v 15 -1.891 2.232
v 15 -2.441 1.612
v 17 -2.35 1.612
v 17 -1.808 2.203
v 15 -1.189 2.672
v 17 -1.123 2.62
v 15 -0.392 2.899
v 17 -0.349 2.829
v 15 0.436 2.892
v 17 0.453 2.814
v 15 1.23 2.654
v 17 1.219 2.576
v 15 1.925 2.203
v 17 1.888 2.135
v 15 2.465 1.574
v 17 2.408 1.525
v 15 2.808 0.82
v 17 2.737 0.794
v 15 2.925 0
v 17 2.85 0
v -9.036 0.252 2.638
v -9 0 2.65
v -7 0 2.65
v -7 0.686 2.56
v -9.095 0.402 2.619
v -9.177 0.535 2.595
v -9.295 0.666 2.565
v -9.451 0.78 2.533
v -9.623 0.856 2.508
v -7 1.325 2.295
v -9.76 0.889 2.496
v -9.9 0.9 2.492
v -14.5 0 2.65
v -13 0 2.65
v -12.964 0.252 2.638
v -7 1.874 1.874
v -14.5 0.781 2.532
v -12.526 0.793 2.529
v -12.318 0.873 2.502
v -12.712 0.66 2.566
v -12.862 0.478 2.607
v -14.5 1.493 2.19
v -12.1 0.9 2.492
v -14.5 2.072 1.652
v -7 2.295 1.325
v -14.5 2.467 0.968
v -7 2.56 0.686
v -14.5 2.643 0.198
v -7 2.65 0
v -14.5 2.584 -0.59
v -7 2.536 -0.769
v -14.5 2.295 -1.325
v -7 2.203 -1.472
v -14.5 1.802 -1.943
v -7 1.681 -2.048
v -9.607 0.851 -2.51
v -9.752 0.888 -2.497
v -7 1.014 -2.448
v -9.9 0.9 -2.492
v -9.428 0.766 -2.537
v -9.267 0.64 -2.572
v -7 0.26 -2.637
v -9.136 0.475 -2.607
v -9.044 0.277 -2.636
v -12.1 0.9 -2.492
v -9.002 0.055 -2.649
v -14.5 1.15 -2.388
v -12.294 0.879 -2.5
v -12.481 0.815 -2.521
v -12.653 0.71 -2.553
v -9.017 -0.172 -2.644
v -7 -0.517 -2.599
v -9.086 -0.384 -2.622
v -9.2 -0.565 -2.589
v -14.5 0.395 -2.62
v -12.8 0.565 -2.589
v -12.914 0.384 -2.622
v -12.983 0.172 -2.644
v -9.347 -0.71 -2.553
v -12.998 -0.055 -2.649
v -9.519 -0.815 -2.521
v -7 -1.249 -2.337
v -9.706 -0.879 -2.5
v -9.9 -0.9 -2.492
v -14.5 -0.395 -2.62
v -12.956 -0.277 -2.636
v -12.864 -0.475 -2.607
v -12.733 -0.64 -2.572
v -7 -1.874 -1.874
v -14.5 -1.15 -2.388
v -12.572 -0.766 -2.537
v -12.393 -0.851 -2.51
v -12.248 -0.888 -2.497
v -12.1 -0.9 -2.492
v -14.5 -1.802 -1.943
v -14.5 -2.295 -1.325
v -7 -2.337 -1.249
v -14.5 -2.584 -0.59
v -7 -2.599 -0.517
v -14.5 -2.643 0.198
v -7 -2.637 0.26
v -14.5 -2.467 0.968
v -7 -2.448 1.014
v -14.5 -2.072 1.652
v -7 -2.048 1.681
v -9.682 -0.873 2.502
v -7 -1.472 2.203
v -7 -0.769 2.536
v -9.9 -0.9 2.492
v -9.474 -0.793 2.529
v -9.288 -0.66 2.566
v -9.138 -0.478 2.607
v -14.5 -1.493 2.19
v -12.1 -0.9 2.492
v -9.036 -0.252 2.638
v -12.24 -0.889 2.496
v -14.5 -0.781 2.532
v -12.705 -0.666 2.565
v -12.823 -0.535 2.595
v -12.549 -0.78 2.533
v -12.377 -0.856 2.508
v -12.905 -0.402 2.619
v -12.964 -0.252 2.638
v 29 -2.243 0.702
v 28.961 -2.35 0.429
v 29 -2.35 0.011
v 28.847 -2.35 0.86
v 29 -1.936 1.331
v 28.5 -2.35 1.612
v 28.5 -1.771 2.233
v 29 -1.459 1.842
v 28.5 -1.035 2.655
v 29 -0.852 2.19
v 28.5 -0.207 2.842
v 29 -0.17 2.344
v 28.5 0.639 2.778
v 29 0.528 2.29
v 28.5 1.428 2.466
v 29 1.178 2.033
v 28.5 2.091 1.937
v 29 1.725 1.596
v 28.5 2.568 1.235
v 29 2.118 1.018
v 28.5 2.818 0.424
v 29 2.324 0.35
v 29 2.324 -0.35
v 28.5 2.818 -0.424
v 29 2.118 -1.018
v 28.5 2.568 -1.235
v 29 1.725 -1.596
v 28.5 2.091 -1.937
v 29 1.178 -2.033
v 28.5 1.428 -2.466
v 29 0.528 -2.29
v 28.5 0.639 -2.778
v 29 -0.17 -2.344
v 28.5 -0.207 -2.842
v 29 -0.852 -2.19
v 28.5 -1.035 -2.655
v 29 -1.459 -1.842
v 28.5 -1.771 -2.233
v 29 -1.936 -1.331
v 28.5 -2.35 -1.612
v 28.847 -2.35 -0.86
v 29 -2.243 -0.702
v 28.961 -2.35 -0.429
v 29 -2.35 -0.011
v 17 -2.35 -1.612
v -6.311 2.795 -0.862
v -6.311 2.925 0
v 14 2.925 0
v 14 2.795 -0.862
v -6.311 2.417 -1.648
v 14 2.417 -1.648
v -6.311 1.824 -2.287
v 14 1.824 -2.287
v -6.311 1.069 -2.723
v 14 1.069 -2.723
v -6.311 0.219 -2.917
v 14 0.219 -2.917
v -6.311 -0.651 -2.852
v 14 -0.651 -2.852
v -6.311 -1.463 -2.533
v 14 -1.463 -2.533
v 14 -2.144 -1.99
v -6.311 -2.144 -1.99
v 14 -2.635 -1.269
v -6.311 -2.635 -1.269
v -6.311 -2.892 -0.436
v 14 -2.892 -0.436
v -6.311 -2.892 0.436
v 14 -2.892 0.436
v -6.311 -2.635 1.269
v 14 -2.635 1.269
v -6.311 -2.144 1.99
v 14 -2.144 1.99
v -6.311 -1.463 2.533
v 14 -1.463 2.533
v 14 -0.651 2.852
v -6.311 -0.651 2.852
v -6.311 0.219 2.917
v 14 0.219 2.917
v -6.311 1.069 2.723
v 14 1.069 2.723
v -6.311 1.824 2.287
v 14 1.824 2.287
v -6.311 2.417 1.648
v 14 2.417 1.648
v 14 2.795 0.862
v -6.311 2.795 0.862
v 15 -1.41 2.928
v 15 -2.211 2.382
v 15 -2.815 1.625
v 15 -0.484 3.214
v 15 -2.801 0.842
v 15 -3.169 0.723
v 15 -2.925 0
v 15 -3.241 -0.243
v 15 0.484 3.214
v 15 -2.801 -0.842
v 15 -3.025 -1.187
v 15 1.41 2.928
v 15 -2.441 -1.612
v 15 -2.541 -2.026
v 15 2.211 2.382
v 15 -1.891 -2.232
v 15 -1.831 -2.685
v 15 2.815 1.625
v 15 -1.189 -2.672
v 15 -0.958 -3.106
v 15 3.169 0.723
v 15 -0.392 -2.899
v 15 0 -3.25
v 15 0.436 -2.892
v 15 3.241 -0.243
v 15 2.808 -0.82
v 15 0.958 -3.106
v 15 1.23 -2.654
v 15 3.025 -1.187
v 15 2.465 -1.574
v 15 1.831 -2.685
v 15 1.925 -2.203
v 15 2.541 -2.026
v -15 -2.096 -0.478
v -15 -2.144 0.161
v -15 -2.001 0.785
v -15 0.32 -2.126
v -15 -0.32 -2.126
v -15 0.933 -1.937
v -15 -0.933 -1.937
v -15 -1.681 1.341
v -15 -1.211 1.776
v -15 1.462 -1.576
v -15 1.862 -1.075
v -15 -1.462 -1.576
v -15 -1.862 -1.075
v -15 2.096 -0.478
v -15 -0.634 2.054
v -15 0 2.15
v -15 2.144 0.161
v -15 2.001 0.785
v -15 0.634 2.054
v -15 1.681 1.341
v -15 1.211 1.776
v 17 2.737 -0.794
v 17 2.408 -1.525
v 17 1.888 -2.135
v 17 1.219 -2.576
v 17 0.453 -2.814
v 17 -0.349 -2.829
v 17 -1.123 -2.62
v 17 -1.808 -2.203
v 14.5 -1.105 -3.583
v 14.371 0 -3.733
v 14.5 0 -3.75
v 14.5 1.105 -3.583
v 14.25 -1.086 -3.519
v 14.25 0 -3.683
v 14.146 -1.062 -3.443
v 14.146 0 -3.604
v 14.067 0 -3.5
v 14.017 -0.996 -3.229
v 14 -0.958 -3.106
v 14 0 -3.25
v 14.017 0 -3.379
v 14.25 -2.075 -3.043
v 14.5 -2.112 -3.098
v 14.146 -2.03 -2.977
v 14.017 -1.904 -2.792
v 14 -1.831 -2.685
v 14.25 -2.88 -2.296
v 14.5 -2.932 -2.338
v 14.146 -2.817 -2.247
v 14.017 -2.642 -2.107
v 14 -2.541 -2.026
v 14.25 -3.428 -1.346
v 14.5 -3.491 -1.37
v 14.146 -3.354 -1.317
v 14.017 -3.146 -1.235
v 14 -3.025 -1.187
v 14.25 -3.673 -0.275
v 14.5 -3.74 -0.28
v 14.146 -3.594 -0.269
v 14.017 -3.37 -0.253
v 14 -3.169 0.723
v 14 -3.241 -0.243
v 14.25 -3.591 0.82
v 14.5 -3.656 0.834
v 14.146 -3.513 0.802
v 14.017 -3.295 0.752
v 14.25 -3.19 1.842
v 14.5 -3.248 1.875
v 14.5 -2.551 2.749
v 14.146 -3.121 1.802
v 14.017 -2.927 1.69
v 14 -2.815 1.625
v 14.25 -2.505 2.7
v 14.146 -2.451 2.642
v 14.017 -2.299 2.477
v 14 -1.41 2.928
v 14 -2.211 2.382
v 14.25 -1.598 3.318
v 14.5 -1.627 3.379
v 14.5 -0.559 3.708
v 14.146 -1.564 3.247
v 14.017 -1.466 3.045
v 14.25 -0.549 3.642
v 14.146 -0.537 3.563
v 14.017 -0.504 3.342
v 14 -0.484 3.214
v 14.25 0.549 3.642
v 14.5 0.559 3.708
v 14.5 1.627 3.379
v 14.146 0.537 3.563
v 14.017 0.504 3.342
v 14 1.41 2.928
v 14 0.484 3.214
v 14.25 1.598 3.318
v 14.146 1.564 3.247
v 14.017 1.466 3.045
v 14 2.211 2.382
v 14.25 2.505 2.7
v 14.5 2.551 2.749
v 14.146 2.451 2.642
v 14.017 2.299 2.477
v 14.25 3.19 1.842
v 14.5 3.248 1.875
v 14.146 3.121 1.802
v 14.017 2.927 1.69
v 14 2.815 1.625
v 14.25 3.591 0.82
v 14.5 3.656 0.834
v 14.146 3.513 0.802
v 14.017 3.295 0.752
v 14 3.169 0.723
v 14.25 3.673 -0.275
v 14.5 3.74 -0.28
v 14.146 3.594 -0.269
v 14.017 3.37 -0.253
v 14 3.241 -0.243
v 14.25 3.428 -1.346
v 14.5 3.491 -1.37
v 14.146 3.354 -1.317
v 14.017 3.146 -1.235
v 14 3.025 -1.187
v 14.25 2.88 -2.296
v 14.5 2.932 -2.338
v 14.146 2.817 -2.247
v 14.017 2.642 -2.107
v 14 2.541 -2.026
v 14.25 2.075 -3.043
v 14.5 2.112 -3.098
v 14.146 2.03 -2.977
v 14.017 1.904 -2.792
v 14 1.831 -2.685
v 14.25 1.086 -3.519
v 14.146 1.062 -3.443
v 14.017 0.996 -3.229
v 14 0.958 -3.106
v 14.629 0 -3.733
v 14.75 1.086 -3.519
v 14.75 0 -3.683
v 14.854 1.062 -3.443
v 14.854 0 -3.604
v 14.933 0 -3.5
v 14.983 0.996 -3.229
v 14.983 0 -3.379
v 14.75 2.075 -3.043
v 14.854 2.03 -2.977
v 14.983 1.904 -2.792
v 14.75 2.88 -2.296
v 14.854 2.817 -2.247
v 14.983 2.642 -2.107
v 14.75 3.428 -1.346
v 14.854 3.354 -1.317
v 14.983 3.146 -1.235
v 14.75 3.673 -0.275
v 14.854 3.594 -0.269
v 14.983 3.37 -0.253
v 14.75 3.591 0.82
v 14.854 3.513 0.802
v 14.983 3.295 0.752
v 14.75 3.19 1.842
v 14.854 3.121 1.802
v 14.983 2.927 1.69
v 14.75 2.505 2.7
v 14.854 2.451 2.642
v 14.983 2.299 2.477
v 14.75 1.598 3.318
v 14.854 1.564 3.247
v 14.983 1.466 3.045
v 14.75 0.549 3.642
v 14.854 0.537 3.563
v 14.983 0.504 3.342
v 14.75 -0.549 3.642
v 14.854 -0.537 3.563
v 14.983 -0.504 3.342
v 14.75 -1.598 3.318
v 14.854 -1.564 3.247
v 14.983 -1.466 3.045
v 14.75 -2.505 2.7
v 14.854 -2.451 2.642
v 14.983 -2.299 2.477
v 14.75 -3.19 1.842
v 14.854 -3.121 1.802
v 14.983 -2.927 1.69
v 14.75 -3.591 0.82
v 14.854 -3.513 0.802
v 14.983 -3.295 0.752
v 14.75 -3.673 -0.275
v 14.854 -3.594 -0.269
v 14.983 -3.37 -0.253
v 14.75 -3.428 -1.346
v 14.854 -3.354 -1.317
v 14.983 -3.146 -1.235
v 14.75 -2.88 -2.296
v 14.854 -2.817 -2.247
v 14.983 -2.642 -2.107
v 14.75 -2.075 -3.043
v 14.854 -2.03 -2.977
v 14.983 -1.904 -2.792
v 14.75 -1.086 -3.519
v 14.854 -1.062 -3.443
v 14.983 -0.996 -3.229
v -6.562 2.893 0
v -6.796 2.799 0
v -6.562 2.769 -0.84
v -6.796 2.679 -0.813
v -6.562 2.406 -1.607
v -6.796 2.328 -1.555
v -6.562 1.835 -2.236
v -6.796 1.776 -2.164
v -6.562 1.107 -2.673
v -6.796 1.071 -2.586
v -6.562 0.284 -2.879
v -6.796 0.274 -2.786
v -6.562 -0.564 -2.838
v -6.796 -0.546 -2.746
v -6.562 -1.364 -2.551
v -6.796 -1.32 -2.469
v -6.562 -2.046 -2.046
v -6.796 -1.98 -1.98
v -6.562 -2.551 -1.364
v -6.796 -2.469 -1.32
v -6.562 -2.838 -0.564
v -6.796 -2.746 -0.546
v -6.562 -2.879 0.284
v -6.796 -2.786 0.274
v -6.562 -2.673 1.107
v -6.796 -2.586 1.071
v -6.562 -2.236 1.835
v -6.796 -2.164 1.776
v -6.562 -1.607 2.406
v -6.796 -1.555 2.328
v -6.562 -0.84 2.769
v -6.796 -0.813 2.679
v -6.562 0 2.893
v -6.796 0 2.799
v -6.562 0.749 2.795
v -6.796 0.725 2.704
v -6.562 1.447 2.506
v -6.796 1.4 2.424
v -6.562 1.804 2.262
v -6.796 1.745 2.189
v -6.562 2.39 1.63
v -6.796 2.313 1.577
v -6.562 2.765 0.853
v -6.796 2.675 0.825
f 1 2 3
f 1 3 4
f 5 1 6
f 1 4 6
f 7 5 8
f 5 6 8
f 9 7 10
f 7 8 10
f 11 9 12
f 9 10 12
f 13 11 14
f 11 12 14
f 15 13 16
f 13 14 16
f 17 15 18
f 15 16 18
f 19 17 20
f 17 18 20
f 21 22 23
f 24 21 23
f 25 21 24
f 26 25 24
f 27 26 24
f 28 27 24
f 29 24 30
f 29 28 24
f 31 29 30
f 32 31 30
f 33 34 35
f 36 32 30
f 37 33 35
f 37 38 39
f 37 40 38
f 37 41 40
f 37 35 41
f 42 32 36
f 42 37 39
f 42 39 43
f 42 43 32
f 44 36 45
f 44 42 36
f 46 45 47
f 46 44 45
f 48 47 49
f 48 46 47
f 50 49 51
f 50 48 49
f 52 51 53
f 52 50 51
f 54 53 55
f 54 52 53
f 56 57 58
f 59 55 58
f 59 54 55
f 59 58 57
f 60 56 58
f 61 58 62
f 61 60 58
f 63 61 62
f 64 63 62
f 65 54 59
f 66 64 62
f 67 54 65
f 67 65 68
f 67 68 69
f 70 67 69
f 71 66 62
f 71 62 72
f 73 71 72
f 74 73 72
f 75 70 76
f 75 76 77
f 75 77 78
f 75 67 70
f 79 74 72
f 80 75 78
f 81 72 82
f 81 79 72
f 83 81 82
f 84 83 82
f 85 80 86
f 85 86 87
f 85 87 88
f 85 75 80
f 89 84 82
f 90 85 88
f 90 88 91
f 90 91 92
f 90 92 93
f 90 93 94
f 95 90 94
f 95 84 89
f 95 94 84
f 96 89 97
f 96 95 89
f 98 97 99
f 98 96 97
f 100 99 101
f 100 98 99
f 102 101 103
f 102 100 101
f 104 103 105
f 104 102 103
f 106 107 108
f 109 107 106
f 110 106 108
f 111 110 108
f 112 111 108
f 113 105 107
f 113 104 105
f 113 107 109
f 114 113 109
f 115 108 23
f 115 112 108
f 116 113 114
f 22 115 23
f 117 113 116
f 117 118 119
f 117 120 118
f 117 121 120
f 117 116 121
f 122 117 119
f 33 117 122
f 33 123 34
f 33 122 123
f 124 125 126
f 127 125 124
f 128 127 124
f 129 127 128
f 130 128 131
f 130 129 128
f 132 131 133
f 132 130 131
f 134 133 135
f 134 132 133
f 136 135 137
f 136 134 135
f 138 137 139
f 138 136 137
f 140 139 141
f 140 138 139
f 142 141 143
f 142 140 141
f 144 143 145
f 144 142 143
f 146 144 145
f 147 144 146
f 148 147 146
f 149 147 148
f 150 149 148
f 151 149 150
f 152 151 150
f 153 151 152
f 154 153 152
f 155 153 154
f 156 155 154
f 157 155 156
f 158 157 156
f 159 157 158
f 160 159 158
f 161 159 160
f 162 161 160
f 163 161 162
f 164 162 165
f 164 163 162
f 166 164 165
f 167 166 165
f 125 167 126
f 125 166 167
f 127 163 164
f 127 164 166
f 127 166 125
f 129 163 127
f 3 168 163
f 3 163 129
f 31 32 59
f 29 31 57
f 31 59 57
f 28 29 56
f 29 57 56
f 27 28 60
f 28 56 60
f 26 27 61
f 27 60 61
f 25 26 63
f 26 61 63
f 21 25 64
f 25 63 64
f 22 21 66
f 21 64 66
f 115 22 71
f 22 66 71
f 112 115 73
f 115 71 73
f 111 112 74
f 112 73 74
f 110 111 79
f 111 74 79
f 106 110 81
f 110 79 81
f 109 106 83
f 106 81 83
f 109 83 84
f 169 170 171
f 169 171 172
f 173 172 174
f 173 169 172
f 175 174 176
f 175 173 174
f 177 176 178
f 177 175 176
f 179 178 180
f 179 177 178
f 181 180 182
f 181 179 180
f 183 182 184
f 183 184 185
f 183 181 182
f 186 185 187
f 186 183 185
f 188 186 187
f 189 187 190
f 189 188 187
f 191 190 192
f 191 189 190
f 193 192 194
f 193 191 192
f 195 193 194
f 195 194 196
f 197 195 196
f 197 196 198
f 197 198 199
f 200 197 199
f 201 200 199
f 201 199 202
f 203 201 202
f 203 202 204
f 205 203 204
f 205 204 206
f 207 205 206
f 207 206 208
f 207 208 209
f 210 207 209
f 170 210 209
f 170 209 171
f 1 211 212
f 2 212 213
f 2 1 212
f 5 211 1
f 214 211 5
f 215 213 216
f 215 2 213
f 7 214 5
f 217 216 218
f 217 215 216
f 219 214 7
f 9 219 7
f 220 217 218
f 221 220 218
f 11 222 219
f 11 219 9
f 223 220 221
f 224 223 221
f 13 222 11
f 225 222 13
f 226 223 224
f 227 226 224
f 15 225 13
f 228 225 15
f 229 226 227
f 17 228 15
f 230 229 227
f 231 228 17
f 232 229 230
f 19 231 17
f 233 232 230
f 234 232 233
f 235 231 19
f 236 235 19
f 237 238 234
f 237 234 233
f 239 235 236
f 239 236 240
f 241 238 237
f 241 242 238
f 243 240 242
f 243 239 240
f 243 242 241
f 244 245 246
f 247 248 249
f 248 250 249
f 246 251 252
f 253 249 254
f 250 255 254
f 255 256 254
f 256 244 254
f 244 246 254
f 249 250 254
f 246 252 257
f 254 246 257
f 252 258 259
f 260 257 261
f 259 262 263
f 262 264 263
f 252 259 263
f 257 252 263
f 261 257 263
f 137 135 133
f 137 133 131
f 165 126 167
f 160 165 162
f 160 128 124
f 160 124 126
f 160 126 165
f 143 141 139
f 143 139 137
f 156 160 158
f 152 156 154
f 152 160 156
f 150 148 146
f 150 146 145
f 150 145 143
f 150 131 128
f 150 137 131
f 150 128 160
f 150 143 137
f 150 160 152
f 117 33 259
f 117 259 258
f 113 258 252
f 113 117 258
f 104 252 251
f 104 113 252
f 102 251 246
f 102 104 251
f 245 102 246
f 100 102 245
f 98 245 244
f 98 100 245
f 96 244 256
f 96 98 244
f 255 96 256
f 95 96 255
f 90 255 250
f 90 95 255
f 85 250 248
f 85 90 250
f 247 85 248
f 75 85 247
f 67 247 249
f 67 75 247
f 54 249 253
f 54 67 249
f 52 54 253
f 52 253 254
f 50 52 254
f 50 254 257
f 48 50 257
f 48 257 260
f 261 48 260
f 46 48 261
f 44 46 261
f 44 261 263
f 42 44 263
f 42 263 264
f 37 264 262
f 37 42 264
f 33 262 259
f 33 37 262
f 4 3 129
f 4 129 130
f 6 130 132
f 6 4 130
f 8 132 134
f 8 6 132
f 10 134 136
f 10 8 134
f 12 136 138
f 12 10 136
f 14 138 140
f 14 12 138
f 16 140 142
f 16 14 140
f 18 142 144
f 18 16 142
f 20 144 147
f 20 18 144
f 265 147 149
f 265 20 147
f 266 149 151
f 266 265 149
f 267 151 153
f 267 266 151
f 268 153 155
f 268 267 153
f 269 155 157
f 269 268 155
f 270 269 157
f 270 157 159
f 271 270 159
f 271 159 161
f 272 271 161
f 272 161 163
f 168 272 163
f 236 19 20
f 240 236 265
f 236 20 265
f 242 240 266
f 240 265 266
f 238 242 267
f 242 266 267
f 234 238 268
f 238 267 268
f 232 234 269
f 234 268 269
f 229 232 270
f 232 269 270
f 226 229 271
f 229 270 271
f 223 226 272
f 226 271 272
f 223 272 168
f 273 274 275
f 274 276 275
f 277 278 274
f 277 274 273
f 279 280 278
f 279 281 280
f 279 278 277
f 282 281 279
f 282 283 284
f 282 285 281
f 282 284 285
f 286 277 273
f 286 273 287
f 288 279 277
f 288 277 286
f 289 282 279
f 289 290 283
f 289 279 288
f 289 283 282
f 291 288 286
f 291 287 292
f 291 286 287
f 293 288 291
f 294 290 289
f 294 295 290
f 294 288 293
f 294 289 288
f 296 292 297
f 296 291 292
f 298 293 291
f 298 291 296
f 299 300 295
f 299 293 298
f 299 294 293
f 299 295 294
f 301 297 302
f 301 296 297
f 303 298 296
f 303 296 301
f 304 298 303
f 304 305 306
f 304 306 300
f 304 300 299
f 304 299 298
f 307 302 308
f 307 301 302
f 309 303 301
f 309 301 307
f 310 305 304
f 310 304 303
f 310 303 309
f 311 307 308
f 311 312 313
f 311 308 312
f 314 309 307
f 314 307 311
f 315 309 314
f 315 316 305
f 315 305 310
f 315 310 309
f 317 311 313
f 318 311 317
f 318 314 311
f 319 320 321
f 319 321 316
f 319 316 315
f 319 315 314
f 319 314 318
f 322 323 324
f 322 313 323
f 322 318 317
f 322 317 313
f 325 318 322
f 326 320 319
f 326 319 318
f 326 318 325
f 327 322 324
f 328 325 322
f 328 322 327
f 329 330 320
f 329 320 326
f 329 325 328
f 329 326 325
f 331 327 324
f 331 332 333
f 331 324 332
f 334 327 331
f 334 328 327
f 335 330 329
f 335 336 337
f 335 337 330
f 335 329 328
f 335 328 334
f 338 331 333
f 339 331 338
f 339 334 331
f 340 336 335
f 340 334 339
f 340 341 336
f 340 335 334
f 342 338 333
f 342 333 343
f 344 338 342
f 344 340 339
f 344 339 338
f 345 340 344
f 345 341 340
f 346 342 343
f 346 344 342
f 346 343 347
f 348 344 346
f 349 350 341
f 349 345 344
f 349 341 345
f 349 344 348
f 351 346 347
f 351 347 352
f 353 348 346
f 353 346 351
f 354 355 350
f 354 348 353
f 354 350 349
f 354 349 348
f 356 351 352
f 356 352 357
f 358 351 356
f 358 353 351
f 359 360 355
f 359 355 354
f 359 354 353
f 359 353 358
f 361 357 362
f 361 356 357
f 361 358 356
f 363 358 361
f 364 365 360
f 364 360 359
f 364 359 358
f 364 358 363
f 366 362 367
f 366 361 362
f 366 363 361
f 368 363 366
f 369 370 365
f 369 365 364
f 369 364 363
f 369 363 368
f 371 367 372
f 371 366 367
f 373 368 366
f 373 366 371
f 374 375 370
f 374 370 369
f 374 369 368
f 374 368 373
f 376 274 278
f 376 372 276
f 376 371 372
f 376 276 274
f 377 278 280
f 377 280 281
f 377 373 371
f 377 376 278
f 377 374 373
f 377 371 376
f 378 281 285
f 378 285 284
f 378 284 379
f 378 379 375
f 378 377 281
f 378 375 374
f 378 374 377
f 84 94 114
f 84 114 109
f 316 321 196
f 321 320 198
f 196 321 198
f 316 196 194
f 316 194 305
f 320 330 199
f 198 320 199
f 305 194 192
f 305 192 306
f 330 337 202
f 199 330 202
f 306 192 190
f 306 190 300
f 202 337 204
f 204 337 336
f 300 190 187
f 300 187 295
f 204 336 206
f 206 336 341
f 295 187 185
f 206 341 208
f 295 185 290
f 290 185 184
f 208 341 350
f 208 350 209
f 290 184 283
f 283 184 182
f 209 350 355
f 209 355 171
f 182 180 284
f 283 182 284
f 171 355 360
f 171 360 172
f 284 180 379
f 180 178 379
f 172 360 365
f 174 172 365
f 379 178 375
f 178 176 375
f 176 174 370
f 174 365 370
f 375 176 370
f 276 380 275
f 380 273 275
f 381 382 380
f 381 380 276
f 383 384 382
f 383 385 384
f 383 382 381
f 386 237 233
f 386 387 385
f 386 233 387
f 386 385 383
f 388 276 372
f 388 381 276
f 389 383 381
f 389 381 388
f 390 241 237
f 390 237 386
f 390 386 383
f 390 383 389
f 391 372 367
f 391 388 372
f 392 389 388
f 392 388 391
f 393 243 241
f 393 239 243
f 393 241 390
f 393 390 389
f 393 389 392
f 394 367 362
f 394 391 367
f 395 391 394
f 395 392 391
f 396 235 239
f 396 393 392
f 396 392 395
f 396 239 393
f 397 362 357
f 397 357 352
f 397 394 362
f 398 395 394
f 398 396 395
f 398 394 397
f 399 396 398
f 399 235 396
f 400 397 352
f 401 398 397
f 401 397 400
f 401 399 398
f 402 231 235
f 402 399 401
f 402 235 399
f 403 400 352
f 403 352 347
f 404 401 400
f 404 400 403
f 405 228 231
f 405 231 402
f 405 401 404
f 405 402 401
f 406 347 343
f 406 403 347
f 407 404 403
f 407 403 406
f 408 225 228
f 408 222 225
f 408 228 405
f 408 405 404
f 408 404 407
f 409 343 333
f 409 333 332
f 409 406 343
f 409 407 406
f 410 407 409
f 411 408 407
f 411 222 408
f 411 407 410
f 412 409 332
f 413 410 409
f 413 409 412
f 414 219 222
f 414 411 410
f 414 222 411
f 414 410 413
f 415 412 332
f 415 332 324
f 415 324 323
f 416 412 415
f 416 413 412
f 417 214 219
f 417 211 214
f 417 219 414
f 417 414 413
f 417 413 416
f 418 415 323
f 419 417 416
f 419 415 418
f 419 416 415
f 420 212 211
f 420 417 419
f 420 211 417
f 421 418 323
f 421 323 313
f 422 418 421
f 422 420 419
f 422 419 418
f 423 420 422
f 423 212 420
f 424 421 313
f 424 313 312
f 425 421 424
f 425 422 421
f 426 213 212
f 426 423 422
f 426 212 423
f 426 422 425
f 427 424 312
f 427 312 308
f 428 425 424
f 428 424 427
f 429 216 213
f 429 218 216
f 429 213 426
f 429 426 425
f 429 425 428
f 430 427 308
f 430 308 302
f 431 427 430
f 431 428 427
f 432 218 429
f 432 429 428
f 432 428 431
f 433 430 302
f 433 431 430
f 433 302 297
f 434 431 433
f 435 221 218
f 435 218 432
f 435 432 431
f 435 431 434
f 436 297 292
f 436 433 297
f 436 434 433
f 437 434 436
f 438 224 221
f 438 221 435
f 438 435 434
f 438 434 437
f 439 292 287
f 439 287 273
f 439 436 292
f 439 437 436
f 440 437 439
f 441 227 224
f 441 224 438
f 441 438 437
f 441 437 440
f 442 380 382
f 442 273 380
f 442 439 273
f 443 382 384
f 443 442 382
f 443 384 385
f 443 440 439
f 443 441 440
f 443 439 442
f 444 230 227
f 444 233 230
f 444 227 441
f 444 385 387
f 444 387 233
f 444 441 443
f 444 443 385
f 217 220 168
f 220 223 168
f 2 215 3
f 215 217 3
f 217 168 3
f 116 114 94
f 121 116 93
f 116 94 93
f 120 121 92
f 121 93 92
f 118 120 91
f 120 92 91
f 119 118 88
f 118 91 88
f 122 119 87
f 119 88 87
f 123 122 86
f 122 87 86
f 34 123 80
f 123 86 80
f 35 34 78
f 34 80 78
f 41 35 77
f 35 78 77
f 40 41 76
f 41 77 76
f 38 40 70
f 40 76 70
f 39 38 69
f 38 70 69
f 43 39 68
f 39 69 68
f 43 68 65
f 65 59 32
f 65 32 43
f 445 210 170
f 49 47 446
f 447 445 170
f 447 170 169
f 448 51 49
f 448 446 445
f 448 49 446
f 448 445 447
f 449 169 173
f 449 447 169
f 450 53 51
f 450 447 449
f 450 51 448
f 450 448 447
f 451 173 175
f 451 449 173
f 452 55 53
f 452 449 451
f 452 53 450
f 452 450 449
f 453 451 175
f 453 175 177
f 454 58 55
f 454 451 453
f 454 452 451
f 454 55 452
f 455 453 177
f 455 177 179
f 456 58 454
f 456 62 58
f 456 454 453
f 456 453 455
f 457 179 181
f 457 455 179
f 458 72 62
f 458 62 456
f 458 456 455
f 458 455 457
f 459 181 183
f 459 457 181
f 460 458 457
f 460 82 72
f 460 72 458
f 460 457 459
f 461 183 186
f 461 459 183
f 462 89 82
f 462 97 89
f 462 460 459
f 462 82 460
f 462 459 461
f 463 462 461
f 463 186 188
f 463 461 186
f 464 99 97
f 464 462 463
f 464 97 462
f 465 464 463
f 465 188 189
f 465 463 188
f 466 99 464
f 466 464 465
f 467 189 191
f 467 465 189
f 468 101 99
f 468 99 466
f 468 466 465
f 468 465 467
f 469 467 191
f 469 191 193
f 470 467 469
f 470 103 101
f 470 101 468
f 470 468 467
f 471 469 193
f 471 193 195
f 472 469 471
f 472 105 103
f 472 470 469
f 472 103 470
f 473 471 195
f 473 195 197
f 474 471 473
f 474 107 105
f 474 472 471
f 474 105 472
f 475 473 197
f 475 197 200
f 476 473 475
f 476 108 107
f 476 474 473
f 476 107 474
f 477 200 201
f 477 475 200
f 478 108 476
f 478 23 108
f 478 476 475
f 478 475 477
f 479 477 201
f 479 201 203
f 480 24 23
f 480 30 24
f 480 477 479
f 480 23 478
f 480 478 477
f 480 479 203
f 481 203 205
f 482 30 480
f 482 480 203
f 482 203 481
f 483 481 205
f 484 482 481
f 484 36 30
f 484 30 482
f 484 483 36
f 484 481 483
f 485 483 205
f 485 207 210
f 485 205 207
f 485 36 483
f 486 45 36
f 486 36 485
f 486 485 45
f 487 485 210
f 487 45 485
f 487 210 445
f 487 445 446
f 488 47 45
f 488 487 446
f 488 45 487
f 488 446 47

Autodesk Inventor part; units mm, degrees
ref_plane "YZ Plane" through (0, 0, 0) normal (1, 0, 0) x (0, 1, 0)
ref_plane "XZ Plane" through (0, 0, 0) normal (0, 1, 0) x (-1, 0, 0)
sketch "Sketch1" plane through (0, 0, 0) normal (1, 0, 0) x (0, 1, 0)
  circle A0 centre (0, 0) radius 2.925
  dimension "diameter" = 5.85
extrude "Shaft" add sketch "Sketch1" along normal mid plane 30
sketch "Sketch2" plane through (0, 0, 0) normal (0, 0, 1) x (1, 0, 0)
  line L0 (-15, -2.925) -> (-15, 2.925) construction
  line L1 (15, -2.925) -> (-15, -2.925) construction
  line L2 (15, 2.925) -> (15, -2.925) construction
  line L3 (-15, 2.925) -> (15, 2.925) construction
  line L4 (-15, -2.925) -> (15, -2.925) projected
  line L5 (-8, -2.925) -> (-8, -2.925)
  line L6 (-15, -2.925) -> (15, -2.925) projected
  line L7 (-13, 0) -> (-9, 0) construction
  line L8 (-12.1, -0.9) -> (-9.9, -0.9)
  line L9 (-9.9, 0.9) -> (-12.1, 0.9)
  arc A0 (-12.1, 0.9) -> (-12.1, -0.9) centre (-12.1, 0) ccw
  arc A1 (-9.9, -0.9) -> (-9.9, 0.9) centre (-9.9, 0) ccw
  point P0 (0, 0)
  point P1 (15, 0)
  point P2 (-11, 0)
  dimension "d17" = 1.8
  dimension "d20" = 2
  dimension "d21" = 1
  dimension "d22" = 7
extrude "Slot for Differential Gear" cut sketch "Sketch2" along normal through all both and the other way through all
ref_plane "Work Plane1" through (17, 0, 0) normal (1, 0, 0) x (0, 0, -1)
sketch "Sketch3" plane through (17, 0, 0) normal (1, 0, 0) x (0, 0, -1)
  arc A0 (1.6583, -2.5) -> (-1.6583, -2.5) centre (0, 0) ccw construction
  circle A1 centre (0, 0) radius 2.925 construction
  line L0 (-1.6583, -2.5) -> (1.6583, -2.5)
  arc A2 (1.6125, -2.35) -> (-1.6125, -2.35) centre (0, 0) ccw
  line L1 (1.6125, -2.35) -> (-1.6125, -2.35)
  point P0 (-1.5184, -2.5)
  point P1 (1.5184, -2.5)
  dimension "d49" = 3
  dimension "d50" = 2.5
  dimension "wheel_offset" = 0.15
extrude "Wheel Insert Profile" add sketch "Sketch3" along normal blind 12
loft "Loft1" add section 1 edges at (15, -2.925, 0) section 2 edges at (17, -2.35, 0) (17, 2.85, 0)
ref_plane "Work Plane2" through (15, 2.3671, 1.5873) normal (1, 0, 0) x (0, 0, -1)
sketch "Sketch4" plane through (15, 2.3671, 1.5873) normal (1, 0, 0) x (0, 0, -1)
  circle A0 centre (1.5873, -2.3671) radius 3.75
  dimension "d35" = 7.5
extrude "Stopper" add sketch "Sketch4" against normal blind 1
fillet "Fillet1" radius 0.5 2 edges at (15, 0, 3.75) (14, 0, 3.75)
sketch "Sketch8" plane through (-15, 0, 0) normal (-1, 0, 0) x (0, 0, 1)
  circle A0 centre (0, 0) radius 2.925 projected
  circle A1 centre (0, 0) radius 2.7 construction
  circle A2 centre (0, 0) radius 2.65
  dimension "d68" = 5.4
  dimension "d69" = 0.05
extrude "Differential Gear Insert Profile" cut sketch "Sketch8" against normal blind 8
fillet "Fillet3" radius 1 1 edges at (-7, -2.925, 0)
chamfer "Chamfer4" distance 0.5 angle 45 2 edges at (-15, 0, -2.65) (29, 2.85, 0)
properties part number "rear shaft v2"
